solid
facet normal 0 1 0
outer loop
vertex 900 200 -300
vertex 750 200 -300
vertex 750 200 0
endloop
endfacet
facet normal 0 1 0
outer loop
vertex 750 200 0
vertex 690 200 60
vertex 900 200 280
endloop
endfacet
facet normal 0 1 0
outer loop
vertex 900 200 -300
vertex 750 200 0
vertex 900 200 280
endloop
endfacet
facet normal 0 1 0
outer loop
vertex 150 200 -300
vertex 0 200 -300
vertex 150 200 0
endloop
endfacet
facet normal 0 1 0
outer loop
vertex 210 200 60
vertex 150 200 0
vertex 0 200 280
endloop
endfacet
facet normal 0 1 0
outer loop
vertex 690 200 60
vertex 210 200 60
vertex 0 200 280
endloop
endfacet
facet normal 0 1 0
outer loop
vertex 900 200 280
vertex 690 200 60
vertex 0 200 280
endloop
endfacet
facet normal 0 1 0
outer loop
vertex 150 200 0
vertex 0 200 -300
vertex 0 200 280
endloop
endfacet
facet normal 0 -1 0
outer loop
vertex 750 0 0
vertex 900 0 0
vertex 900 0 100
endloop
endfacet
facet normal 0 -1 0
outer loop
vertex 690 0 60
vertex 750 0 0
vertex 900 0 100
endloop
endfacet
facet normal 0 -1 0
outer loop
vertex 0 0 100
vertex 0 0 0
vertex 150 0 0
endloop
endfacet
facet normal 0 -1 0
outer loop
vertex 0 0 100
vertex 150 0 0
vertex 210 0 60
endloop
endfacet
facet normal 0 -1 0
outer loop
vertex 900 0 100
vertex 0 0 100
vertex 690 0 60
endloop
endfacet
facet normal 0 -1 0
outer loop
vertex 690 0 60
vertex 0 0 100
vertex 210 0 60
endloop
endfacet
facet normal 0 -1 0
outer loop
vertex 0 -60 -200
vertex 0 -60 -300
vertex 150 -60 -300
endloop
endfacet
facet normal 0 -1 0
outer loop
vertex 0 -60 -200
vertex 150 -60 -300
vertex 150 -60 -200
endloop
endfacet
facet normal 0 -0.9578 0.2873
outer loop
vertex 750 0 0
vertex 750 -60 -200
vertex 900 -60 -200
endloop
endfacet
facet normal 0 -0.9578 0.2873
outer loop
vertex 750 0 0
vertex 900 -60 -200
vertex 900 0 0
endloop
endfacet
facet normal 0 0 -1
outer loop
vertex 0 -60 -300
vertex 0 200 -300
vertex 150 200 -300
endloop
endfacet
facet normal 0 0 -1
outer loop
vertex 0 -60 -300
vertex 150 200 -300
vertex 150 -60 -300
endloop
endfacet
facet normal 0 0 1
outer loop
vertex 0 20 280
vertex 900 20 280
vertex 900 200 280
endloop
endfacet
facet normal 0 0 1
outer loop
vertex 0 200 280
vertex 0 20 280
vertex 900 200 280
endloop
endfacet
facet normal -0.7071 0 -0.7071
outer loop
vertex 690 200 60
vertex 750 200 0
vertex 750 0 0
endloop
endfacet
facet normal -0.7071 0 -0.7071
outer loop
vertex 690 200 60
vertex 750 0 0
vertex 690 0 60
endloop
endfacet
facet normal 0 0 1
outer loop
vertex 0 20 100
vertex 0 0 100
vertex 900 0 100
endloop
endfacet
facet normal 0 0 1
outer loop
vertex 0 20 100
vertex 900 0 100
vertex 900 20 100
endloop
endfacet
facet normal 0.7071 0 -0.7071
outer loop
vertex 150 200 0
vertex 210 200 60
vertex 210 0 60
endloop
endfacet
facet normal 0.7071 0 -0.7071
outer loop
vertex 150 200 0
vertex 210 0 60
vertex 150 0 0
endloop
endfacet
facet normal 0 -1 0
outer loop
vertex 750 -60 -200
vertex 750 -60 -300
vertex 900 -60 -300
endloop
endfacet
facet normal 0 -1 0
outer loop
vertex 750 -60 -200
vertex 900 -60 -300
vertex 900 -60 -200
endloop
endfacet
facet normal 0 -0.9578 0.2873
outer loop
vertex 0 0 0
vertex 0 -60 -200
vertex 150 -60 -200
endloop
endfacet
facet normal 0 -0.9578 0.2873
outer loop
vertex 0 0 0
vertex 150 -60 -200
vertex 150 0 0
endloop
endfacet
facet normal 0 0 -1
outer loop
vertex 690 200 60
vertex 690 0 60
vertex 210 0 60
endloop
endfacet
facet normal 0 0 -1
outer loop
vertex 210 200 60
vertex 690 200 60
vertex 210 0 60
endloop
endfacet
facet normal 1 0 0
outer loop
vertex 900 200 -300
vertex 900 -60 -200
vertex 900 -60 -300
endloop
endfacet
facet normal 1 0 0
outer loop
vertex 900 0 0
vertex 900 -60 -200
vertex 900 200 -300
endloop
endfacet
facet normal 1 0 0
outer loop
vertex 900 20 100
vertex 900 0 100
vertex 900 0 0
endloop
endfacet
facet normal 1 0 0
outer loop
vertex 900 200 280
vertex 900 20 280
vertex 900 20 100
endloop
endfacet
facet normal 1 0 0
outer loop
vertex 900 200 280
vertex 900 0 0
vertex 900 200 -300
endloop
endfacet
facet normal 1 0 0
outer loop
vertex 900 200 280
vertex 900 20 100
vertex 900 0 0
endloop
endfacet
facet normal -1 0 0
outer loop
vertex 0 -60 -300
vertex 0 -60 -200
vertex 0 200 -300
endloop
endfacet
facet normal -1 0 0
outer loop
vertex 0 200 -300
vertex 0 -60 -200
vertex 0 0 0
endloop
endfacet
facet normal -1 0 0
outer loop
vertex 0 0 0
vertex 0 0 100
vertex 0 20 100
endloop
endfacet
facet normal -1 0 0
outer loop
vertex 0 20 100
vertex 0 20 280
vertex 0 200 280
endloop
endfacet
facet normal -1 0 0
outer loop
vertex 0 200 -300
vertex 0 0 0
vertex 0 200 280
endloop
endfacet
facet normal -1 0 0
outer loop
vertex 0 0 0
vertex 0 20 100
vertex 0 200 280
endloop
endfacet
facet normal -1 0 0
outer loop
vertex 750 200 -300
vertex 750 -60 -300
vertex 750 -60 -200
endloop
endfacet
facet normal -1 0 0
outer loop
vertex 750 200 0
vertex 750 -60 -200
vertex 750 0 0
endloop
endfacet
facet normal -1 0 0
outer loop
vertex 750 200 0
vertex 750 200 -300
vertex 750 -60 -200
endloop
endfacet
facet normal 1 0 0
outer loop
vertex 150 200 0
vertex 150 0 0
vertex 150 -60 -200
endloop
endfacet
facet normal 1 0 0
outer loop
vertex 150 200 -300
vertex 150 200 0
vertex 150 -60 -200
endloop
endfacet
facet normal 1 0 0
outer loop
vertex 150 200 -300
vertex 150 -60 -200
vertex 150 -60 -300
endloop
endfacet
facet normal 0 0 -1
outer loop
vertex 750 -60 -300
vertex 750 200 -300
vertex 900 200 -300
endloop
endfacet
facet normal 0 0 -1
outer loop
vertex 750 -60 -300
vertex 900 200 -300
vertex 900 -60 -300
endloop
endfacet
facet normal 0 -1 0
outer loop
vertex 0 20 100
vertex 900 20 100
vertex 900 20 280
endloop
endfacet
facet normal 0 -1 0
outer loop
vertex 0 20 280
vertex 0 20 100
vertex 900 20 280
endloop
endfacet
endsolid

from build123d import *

# Parameters (mm, degrees)
SKETCH_W          = 200
SKETCH_H          = 100
SKETCH_W_2        = 180
SKETCH_H_2        = 150
SKETCH_H_3        = 30
PAD_DEPTH         = 900
POCKET_DEPTH      = 200.001
POCKET_DEPTH_BACK = -60.001
SKETCH002_W       = 20
SKETCH002_H       = 30
POCKET001_DEPTH   = 900.001


with BuildPart() as part:
    # Sketch → Pad (new body)
    with BuildSketch(Plane.YZ):
        with Locations((100, 50)):
            Rectangle(SKETCH_W, SKETCH_H)
        with Locations((110, 175)):
            Rectangle(SKETCH_W_2, SKETCH_H_2)
        with Locations((100, 265)):
            Rectangle(SKETCH_W, SKETCH_H_3)
        Polygon((0, 0), (200, 0), (200, -300), (-60, -300), (-60, -200), align=None)
    extrude(amount=PAD_DEPTH)

    # Sketch001 (on Face6 of Pad) → Pocket (cut, two sides)
    with BuildSketch(Plane(origin=(0, 0, 0), x_dir=(0, 0, -1), z_dir=(0, -1, 0))) as pocket_sk:
        Polygon((0, 150), (494.350739, 150), (494.350739, 750), (0, 750), (-60, 690), (-60, 210), align=None)
    extrude(amount=-POCKET_DEPTH, mode=Mode.SUBTRACT)
    extrude(pocket_sk.sketch, amount=-POCKET_DEPTH_BACK, mode=Mode.SUBTRACT)

    # Sketch002 (on Face5 of Pocket) → Pocket001 (cut, through all)
    with BuildSketch(Plane.YZ.offset(900)):
        with Locations((10, 265)):
            Rectangle(SKETCH002_W, SKETCH002_H)
    extrude(amount=-POCKET001_DEPTH, mode=Mode.SUBTRACT)


solid = part.part
